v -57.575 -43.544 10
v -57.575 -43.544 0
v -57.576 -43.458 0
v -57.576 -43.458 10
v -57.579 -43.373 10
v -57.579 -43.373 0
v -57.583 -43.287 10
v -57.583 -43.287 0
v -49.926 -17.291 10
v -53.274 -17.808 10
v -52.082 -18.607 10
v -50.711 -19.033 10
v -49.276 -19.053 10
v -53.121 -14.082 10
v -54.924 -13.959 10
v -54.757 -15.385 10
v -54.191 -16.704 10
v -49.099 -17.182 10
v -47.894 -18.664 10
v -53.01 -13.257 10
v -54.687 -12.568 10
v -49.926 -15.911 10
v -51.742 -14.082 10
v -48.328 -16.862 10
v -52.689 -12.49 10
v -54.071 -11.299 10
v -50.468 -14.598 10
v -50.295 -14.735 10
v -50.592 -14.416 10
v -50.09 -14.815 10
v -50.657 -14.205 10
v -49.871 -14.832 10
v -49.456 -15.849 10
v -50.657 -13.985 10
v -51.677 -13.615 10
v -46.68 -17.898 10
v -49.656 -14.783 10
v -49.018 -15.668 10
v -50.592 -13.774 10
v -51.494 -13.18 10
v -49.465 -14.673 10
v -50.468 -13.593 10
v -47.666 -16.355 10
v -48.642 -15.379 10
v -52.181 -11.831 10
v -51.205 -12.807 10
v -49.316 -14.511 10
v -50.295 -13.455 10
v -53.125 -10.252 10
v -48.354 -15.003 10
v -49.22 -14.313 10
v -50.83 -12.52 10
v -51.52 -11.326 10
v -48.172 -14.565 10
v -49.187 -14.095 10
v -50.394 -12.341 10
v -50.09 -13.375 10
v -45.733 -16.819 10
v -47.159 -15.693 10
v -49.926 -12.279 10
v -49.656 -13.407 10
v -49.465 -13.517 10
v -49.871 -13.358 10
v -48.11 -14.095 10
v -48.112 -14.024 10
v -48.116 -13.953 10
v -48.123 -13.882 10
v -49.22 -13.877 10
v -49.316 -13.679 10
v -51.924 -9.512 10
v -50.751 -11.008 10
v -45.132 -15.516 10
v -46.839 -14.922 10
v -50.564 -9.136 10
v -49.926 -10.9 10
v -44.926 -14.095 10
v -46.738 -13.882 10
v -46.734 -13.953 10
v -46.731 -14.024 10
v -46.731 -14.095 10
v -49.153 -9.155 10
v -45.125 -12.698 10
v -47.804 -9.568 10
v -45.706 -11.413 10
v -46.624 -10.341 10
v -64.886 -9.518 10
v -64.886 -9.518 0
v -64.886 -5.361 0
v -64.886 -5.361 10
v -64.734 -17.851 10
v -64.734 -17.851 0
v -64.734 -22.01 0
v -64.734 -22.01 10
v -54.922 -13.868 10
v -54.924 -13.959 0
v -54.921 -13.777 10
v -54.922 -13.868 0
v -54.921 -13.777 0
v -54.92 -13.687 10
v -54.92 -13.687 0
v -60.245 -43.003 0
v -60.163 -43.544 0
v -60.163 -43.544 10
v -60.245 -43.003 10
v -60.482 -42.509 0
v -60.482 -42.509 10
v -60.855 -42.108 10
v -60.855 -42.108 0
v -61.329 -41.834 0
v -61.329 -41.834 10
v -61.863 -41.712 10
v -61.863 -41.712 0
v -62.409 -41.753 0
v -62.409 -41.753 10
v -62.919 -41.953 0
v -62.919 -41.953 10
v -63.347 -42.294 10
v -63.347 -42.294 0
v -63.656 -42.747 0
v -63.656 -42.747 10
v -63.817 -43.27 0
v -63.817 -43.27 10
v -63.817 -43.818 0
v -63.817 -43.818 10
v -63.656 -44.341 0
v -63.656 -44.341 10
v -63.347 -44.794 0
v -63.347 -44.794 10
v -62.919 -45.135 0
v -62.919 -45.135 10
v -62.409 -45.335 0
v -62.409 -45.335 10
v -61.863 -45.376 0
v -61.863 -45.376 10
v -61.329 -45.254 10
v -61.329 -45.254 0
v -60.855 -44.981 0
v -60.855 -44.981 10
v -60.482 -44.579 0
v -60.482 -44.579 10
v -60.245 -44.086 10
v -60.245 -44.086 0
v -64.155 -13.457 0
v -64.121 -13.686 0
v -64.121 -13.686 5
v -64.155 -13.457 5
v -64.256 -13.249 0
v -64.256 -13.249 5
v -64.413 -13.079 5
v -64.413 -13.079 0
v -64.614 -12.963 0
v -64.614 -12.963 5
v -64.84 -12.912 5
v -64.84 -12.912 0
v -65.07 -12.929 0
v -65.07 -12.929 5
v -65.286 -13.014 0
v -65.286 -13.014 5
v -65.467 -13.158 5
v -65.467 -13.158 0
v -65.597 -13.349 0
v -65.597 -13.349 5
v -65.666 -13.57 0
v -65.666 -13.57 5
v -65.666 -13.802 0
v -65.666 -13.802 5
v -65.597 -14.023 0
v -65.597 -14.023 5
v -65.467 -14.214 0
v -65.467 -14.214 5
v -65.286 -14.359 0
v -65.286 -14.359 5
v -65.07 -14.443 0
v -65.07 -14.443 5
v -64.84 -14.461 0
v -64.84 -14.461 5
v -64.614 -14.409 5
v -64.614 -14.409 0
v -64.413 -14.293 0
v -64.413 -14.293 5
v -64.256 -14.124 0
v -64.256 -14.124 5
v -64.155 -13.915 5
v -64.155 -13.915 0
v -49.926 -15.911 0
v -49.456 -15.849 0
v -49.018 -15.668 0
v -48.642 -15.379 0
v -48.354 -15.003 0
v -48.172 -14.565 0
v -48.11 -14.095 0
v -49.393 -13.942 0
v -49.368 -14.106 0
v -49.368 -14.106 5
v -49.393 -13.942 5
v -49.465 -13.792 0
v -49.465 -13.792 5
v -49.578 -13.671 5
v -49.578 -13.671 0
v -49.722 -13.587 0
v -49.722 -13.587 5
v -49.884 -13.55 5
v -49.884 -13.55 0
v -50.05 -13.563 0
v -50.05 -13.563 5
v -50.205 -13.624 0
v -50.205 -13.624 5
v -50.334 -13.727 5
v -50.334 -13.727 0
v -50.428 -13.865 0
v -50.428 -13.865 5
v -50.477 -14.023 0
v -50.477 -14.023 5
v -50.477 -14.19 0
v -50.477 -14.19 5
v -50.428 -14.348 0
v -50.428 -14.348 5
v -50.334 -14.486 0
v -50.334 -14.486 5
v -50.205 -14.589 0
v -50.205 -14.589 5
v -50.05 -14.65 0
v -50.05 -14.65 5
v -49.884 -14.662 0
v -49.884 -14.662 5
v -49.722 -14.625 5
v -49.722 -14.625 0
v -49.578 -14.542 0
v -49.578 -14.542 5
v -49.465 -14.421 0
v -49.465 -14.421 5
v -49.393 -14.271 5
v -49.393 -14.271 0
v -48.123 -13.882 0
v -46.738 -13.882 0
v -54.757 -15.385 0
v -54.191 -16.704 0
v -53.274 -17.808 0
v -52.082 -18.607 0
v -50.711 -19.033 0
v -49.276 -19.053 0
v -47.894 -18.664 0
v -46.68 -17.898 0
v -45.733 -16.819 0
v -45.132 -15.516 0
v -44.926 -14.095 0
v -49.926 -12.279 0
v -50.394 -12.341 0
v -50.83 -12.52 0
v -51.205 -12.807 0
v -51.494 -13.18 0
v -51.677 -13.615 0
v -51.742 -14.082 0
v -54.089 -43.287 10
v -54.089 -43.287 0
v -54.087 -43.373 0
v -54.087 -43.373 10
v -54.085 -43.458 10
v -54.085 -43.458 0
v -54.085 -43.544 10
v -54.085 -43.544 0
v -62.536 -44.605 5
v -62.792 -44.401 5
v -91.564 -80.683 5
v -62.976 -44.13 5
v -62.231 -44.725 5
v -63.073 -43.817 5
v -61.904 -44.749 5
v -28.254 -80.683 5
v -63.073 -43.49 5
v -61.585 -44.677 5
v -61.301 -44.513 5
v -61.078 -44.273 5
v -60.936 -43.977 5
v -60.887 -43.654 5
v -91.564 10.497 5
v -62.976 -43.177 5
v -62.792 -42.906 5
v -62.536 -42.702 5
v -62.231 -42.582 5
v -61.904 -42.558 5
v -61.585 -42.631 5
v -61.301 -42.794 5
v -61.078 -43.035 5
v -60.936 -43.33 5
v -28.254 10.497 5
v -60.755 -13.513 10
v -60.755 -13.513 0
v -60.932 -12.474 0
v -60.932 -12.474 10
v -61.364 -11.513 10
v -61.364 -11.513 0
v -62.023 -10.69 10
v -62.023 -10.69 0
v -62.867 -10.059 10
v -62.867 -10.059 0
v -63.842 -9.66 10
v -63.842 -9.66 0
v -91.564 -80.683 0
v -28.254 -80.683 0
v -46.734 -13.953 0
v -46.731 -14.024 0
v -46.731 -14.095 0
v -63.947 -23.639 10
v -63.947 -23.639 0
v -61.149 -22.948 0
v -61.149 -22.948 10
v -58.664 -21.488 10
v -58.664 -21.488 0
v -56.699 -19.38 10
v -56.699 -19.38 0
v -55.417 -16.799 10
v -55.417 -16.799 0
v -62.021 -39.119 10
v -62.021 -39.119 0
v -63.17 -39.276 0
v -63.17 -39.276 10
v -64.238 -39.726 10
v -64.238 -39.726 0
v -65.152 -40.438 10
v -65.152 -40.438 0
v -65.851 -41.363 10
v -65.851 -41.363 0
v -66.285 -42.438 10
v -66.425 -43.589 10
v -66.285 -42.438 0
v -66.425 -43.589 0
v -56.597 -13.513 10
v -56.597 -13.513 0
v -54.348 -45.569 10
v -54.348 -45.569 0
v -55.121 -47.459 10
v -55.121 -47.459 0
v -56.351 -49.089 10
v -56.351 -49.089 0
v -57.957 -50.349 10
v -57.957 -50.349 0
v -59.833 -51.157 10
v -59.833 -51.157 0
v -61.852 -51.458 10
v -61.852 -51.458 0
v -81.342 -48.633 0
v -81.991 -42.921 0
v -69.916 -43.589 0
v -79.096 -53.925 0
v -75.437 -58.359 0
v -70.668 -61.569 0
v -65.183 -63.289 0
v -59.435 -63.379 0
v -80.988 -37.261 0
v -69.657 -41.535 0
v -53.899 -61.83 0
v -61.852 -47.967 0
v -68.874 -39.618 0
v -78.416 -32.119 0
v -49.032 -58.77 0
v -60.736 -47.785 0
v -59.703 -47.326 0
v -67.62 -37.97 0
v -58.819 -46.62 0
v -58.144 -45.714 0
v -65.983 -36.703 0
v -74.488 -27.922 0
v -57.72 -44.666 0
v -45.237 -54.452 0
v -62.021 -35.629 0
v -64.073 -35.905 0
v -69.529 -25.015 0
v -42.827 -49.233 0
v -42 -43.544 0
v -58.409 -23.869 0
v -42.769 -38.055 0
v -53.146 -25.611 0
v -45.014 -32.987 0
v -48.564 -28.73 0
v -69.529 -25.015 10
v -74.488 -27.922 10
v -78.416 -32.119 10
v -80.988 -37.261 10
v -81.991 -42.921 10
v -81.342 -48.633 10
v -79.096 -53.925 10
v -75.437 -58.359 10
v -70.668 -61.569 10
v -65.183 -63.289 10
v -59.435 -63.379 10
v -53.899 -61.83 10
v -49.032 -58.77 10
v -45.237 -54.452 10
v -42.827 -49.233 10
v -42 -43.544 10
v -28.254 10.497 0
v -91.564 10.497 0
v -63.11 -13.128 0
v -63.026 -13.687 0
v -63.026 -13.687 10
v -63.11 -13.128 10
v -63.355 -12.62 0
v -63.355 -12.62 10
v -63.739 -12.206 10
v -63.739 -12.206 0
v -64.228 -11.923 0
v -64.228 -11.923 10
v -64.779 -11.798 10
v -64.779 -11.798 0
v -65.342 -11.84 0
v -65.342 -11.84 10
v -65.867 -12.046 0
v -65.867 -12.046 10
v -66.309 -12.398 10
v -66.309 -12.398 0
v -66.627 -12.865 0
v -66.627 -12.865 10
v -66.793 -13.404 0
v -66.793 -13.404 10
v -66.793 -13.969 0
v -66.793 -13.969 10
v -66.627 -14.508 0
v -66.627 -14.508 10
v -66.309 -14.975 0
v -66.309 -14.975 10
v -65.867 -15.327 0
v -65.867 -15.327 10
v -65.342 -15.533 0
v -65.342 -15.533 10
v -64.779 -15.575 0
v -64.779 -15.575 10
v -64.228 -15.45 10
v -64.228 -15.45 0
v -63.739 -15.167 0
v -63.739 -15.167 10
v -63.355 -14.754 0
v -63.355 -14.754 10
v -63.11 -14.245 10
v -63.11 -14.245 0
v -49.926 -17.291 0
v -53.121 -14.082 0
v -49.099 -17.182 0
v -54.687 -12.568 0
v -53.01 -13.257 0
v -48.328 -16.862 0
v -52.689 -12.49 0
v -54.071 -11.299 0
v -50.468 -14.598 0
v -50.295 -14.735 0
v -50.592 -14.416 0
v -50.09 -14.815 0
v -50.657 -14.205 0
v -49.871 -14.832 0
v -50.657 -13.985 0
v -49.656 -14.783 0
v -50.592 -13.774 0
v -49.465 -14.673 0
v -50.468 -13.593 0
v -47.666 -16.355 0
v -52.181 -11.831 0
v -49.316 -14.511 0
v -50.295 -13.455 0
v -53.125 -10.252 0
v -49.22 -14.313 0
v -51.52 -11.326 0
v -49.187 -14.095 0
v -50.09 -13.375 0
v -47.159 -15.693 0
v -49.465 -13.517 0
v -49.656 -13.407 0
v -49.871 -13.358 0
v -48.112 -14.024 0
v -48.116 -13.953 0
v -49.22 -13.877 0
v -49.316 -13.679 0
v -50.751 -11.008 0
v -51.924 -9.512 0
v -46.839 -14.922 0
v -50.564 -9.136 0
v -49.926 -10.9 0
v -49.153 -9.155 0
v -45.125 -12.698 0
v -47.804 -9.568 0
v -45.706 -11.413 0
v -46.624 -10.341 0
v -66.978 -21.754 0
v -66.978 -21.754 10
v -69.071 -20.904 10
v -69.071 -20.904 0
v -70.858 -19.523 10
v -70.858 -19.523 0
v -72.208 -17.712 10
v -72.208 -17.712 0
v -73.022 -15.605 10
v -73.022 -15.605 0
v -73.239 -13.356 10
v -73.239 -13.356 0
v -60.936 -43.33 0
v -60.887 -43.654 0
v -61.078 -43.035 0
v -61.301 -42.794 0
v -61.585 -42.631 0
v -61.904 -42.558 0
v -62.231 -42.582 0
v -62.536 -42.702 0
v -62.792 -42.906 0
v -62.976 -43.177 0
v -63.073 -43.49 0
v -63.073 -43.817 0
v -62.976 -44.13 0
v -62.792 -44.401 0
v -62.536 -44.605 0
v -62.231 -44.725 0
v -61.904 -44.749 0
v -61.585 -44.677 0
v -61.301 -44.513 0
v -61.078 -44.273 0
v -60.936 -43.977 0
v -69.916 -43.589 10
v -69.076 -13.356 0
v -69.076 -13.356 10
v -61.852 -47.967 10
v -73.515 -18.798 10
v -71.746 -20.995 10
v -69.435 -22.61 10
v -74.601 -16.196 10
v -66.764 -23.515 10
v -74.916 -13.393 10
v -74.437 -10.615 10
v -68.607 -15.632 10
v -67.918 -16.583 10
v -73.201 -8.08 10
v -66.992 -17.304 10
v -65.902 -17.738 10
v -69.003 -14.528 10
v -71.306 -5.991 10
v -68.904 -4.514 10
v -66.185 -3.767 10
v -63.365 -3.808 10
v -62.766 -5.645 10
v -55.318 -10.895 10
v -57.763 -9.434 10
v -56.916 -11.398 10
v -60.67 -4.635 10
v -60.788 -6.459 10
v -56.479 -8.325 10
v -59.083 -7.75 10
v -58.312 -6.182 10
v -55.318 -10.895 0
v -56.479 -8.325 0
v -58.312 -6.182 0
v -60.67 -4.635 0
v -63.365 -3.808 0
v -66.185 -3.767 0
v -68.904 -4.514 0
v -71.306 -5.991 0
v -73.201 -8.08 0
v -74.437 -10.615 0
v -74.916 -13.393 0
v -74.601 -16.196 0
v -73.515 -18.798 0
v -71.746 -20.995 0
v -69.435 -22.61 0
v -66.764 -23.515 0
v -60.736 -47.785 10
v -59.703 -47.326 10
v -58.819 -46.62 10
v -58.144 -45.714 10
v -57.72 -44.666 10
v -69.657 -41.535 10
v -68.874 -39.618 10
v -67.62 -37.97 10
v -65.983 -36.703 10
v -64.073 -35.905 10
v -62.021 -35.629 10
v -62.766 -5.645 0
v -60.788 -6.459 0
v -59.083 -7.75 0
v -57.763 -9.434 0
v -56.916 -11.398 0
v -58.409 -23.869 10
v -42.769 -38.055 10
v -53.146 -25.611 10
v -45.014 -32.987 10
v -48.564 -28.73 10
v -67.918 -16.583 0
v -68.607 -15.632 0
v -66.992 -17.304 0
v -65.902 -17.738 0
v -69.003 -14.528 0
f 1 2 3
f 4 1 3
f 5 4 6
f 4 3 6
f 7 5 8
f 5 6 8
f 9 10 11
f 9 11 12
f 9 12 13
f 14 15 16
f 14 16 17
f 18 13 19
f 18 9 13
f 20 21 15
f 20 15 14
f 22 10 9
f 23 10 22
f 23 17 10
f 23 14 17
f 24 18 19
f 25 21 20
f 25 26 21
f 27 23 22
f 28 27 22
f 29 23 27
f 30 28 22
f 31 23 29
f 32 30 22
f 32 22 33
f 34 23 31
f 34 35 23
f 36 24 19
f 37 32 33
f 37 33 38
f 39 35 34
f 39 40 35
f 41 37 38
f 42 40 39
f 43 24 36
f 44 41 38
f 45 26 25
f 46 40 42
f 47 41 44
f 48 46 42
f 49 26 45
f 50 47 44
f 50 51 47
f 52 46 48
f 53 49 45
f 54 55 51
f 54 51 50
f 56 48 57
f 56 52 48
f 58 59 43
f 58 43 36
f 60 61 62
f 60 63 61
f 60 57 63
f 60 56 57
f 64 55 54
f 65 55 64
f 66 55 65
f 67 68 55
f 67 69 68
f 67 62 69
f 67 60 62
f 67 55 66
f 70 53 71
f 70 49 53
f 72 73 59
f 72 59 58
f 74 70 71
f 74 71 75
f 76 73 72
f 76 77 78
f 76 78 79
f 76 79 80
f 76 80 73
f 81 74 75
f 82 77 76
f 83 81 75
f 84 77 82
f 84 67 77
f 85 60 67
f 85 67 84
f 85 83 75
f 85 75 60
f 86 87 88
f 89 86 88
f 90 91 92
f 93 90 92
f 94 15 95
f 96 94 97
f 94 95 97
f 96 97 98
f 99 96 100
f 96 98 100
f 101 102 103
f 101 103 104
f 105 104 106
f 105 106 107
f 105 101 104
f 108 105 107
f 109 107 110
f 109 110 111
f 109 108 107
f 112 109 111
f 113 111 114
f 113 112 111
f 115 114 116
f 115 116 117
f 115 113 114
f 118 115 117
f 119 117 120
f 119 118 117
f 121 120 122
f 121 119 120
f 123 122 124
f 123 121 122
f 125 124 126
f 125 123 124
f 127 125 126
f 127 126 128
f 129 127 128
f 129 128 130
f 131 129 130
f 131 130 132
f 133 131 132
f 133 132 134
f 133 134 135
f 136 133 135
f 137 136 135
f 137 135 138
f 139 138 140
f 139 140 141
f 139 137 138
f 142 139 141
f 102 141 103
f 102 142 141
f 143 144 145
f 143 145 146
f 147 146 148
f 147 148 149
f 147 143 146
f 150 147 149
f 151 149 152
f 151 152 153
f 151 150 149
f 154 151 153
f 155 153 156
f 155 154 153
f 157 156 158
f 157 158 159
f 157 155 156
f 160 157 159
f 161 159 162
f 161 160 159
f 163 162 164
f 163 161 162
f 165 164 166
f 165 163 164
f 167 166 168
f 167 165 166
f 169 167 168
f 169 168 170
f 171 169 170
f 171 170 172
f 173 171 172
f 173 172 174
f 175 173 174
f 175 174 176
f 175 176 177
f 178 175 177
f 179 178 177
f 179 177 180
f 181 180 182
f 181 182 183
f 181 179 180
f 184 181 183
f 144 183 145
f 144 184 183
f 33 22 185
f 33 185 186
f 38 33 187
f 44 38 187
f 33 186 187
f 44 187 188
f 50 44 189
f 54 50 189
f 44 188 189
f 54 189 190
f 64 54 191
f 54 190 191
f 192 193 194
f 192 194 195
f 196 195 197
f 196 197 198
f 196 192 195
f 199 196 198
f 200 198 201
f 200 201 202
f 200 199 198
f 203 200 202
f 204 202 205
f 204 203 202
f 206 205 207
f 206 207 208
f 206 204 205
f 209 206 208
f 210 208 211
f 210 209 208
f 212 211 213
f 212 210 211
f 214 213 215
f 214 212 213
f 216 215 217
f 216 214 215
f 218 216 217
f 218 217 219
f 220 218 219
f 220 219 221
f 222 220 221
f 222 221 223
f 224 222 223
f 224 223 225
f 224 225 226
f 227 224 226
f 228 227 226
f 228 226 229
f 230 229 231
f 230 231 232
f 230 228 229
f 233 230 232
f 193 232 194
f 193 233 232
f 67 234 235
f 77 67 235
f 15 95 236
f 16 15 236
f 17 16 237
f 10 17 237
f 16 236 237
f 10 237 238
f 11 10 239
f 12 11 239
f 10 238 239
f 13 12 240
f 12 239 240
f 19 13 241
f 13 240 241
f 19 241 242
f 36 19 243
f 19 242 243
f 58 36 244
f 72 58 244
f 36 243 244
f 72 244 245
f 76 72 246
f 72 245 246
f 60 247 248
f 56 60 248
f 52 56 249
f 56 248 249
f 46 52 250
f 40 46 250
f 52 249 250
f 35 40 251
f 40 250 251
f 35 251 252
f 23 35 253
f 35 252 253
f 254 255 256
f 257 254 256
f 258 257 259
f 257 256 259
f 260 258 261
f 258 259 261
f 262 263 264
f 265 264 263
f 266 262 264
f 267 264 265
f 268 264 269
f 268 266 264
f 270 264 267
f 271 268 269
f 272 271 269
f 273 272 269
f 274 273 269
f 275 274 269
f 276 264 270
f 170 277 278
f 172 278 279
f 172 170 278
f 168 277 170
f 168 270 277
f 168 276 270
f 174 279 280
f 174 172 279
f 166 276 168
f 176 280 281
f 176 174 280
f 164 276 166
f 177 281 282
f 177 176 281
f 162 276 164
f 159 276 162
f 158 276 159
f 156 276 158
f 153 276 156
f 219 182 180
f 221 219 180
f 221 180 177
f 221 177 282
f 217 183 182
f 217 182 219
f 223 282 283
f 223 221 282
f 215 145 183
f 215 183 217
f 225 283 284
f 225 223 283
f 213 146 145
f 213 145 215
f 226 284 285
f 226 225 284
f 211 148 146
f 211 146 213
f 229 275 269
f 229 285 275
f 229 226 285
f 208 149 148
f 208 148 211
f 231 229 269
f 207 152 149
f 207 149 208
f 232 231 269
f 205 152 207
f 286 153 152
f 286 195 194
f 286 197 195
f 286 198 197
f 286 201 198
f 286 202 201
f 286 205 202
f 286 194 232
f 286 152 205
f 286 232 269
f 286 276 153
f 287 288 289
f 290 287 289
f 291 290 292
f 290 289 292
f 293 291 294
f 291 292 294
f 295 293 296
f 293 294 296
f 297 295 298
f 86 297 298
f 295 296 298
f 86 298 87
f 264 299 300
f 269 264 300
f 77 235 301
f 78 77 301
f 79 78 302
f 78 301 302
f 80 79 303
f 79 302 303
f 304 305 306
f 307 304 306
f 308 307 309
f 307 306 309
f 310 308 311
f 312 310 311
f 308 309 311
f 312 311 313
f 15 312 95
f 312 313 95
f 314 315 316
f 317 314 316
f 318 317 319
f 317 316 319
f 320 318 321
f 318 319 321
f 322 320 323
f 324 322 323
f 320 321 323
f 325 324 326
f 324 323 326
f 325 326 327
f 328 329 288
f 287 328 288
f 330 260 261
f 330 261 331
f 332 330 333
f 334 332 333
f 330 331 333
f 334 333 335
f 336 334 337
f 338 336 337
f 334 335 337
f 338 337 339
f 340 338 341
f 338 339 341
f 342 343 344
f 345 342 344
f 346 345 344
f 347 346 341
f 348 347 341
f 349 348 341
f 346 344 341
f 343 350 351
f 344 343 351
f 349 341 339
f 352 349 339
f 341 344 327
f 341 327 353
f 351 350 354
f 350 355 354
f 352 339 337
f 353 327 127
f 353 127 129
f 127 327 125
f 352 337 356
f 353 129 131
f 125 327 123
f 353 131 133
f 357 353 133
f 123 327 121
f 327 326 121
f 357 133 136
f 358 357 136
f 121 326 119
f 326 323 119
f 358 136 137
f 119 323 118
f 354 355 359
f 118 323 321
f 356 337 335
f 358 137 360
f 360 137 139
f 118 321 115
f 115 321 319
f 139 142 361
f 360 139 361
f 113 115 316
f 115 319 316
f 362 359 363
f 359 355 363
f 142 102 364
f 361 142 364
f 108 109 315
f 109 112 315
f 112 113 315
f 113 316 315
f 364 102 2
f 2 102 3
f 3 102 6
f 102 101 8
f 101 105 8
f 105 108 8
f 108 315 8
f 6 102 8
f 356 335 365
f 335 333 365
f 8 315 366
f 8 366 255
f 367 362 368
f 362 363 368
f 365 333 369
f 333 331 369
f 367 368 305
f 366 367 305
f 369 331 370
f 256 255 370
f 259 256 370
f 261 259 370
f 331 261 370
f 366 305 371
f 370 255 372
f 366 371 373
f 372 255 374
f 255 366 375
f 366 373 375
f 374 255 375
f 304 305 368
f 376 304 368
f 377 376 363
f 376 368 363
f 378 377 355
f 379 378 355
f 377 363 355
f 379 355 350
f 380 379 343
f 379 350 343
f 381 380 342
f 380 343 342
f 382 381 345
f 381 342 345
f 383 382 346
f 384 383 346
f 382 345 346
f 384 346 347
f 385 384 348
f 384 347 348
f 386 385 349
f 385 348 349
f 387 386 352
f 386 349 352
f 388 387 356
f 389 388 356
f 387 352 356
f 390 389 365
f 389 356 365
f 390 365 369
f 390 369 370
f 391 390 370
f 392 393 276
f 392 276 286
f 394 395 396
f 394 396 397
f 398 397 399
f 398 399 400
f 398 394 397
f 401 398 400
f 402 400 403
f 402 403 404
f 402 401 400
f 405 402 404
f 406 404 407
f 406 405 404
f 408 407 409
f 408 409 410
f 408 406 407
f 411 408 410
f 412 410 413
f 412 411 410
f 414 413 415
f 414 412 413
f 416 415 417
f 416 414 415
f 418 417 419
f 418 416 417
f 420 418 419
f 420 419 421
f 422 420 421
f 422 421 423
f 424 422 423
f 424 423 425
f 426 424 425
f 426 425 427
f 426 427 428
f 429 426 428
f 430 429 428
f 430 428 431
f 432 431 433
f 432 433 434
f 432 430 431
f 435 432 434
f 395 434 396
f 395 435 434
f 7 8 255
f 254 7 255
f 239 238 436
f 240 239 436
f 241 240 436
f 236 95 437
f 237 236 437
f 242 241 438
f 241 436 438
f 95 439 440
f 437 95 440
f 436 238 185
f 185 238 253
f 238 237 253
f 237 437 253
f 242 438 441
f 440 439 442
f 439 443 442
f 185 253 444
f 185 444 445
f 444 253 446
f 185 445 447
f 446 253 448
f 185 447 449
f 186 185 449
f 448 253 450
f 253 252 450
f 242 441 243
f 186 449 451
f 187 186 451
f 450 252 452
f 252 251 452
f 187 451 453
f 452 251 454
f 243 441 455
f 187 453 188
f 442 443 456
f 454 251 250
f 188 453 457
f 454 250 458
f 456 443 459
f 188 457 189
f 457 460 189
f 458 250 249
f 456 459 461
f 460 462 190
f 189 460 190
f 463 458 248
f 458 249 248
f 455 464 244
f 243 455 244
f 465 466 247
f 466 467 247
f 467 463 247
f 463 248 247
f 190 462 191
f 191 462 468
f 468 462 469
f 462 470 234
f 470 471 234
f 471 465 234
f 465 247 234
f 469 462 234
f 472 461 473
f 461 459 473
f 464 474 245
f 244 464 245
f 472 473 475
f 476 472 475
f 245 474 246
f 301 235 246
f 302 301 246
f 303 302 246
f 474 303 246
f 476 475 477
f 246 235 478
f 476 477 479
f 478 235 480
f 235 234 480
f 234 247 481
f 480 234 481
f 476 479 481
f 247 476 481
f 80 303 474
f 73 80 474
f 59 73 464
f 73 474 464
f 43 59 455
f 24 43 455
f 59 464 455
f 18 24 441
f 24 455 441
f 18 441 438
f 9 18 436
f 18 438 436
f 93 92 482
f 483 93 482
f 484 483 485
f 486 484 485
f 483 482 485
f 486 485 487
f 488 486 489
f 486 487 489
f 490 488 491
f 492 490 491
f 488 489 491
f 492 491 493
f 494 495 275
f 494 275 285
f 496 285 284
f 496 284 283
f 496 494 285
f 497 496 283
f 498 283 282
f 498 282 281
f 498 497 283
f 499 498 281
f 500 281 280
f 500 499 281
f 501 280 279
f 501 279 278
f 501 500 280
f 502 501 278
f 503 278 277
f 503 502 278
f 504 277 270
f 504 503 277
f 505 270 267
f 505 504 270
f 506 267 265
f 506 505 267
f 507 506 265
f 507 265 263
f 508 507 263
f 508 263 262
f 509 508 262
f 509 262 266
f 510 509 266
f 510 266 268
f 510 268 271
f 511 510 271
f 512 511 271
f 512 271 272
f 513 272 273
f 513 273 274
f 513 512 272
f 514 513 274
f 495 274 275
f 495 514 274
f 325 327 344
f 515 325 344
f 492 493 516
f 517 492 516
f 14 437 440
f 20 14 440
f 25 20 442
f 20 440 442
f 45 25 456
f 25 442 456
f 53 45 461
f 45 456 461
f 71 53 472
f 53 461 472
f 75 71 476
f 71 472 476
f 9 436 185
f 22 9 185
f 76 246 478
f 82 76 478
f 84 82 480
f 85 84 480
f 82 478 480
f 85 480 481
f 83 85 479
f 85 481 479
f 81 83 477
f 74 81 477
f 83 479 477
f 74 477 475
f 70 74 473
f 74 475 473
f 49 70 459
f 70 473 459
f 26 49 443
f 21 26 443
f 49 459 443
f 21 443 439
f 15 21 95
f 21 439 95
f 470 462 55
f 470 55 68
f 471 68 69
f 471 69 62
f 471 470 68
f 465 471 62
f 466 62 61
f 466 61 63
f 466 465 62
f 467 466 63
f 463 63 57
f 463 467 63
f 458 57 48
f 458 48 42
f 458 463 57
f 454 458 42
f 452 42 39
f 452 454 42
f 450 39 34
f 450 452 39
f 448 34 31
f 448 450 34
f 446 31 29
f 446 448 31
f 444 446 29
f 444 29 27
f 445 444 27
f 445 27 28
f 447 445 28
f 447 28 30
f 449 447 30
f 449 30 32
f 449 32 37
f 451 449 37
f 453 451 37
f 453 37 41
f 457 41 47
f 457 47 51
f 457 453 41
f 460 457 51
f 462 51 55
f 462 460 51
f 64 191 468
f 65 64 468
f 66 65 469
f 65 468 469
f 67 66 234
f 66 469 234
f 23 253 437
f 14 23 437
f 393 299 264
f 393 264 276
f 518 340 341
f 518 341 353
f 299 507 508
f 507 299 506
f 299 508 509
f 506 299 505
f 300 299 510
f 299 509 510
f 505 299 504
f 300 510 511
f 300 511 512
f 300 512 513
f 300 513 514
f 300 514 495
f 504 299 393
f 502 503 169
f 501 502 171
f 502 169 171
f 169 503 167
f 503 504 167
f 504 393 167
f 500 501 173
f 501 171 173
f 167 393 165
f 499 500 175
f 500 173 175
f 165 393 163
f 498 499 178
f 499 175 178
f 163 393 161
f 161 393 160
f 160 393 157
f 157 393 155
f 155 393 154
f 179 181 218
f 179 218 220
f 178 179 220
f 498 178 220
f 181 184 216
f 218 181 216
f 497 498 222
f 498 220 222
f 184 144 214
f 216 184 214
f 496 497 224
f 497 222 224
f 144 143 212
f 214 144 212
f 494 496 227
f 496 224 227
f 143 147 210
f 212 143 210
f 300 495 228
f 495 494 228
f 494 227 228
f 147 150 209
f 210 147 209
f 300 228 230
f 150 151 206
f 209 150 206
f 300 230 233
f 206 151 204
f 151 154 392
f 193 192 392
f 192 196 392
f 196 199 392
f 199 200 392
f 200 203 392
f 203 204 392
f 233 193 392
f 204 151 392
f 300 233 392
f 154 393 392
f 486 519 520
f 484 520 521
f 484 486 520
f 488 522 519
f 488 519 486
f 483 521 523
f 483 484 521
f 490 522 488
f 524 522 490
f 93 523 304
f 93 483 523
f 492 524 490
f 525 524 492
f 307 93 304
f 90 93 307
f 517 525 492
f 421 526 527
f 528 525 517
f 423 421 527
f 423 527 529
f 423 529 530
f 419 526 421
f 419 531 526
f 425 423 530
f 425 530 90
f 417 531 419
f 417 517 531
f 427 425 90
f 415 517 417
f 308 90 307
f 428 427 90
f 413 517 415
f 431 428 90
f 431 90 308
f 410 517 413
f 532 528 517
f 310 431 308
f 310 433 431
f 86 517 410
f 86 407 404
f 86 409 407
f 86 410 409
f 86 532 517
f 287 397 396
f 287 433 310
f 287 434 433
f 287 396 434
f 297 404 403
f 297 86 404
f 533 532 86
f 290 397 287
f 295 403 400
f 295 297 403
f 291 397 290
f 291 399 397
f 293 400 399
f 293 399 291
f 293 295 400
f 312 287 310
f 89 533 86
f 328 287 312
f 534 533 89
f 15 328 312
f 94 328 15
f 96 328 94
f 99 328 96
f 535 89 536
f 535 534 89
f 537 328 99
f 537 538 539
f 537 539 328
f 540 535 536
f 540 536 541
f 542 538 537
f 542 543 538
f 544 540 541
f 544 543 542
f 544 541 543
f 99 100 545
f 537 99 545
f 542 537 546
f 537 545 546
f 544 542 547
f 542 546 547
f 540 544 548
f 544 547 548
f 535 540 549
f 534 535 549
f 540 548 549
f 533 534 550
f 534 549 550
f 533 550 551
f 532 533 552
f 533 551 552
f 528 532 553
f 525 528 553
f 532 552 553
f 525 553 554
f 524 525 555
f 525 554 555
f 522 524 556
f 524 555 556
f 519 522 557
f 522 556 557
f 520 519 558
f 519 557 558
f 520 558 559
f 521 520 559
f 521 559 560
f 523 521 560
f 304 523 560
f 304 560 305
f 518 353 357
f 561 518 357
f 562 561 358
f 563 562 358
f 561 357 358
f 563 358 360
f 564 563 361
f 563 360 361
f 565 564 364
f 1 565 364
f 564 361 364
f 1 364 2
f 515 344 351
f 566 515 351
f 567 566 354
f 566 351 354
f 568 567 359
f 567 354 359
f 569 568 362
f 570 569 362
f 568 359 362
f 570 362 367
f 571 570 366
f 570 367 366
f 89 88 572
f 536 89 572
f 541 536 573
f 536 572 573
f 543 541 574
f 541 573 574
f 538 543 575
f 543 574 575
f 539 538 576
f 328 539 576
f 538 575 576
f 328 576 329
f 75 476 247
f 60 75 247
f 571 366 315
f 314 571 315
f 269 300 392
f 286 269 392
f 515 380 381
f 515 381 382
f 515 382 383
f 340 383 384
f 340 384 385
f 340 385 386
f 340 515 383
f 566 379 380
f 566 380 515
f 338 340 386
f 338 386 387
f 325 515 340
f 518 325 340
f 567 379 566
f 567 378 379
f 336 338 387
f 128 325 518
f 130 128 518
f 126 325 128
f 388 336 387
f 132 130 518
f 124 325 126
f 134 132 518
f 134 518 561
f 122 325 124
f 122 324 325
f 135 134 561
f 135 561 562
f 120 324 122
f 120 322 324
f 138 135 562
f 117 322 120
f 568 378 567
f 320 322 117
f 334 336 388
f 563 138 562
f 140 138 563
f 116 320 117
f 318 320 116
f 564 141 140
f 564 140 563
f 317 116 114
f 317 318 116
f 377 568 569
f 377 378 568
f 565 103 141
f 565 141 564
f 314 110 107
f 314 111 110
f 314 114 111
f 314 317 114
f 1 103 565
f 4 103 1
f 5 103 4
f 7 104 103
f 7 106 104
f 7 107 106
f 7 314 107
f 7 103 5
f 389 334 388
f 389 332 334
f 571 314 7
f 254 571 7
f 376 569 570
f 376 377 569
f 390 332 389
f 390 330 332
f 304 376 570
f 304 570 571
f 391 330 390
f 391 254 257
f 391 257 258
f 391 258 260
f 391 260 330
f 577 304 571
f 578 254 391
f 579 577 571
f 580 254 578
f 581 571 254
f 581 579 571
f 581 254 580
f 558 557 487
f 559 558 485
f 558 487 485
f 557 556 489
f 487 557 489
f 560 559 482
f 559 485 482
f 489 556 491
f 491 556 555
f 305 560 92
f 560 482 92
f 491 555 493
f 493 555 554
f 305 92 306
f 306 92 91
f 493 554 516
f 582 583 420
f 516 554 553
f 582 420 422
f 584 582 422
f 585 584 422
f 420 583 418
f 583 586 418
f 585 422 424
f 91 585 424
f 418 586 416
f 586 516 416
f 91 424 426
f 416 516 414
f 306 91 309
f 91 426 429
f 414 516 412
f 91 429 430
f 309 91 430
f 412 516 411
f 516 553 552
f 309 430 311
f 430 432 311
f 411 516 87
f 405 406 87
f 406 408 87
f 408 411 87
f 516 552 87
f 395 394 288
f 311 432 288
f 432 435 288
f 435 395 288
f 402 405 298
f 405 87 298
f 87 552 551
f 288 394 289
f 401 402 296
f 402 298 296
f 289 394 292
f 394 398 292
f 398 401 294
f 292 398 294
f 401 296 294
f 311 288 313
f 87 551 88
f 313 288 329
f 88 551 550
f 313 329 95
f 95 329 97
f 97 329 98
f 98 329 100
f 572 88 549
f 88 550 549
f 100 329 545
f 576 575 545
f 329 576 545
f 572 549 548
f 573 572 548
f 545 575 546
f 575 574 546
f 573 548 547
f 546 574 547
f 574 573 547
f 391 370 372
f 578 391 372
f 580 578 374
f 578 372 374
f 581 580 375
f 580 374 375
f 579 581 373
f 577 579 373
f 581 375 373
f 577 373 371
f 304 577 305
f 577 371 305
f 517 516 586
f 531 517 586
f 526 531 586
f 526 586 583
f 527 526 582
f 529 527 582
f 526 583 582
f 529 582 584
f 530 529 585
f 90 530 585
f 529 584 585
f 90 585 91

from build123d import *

# Parameters (mm, degrees)
F0_R     = 1.894076
F0_R_2   = 1.837348
F0_R_3   = 0.738832
F1_DEPTH = 10
F2_W     = 63.309941
F2_H     = 91.180074
F2_R     = 1.098943
F2_R_2   = 0.776666
F2_R_3   = 0.557585
F3_DEPTH = 5


with BuildPart() as f1:
    # F0 (on Top) → F1 (new body)
    with BuildSketch(Plane.XY):
        with BuildLine():
            ThreePointArc((-54.924116, -13.958908), (-54.921334, -13.822768), (-54.920407, -13.686602))
            ThreePointArc((-54.920407, -13.686602), (-72.327615, -6.968472), (-63.947062, -23.639119))
            ThreePointArc((-63.947062, -23.639119), (-57.605364, -20.50497), (-54.924116, -13.958908))
        make_face()
        with BuildLine():
            ThreePointArc((-56.59659, -13.512996), (-56.595232, -13.599794), (-56.59478, -13.686602))
            ThreePointArc((-56.59478, -13.686602), (-58.967621, -19.50729), (-64.733604, -22.010134))
            ThreePointArc((-64.733604, -22.010134), (-70.85808, -19.522707), (-73.239478, -13.356229))
            ThreePointArc((-73.239478, -13.356229), (-70.677204, -7.672005), (-64.886253, -5.361044))
            ThreePointArc((-64.886253, -5.361044), (-59.082814, -7.750393), (-56.59659, -13.512996))
        make_face(mode=Mode.SUBTRACT)
        with BuildLine():
            Line((-64.886253, -9.518197), (-64.886253, -5.361044))
            ThreePointArc((-64.886253, -5.361044), (-70.677204, -7.672005), (-73.239478, -13.356229))
            Line((-73.239478, -13.356229), (-69.07584, -13.356229))
            ThreePointArc((-69.07584, -13.356229), (-67.73623, -10.612856), (-64.886253, -9.518197))
        make_face()
        with BuildLine():
            ThreePointArc((-64.733604, -22.010134), (-58.967621, -19.50729), (-56.59478, -13.686602))
            ThreePointArc((-56.59478, -13.686602), (-56.595232, -13.599794), (-56.59659, -13.512996))
            Line((-56.59659, -13.512996), (-60.755479, -13.512996))
            ThreePointArc((-60.755479, -13.512996), (-60.752767, -13.59978), (-60.751862, -13.686602))
            ThreePointArc((-60.751862, -13.686602), (-61.90748, -16.567406), (-64.733604, -17.850959))
            Line((-64.733604, -17.850959), (-64.733604, -22.010134))
        make_face()
        with BuildLine():
            ThreePointArc((-60.751862, -13.686602), (-60.752767, -13.59978), (-60.755479, -13.512996))
            ThreePointArc((-60.755479, -13.512996), (-62.022533, -10.690089), (-64.886253, -9.518197))
            ThreePointArc((-64.886253, -9.518197), (-67.73623, -10.612856), (-69.07584, -13.356229))
            ThreePointArc((-69.07584, -13.356229), (-67.918433, -16.582912), (-64.733604, -17.850959))
            ThreePointArc((-64.733604, -17.850959), (-61.90748, -16.567406), (-60.751862, -13.686602))
        make_face()
        with Locations((-64.920407, -13.686602)):
            Circle(F0_R, mode=Mode.SUBTRACT)
        with BuildLine():
            ThreePointArc((-42.000372, -43.544154), (-48.564111, -28.729738), (-63.947062, -23.639119))
            ThreePointArc((-63.947062, -23.639119), (-75.436632, -58.358569), (-42.000372, -43.544154))
        make_face()
        with BuildLine():
            ThreePointArc((-54.089022, -43.286919), (-54.085887, -43.415519), (-54.084842, -43.544154))
            ThreePointArc((-54.084842, -43.544154), (-56.351147, -49.08869), (-61.852326, -51.458299))
            ThreePointArc((-61.852326, -51.458299), (-67.52905, -49.208898), (-69.915777, -43.58853))
            ThreePointArc((-69.915777, -43.58853), (-67.620487, -37.970113), (-62.021154, -35.628651))
            ThreePointArc((-62.021154, -35.628651), (-56.502415, -37.849587), (-54.089022, -43.286919))
        make_face(mode=Mode.SUBTRACT)
        with BuildLine():
            Line((-57.582658, -43.286919), (-54.089022, -43.286919))
            ThreePointArc((-54.089022, -43.286919), (-56.502415, -37.849587), (-62.021154, -35.628651))
            Line((-62.021154, -35.628651), (-62.021154, -39.119006))
            ThreePointArc((-62.021154, -39.119006), (-58.97116, -40.318284), (-57.582658, -43.286919))
        make_face()
        with BuildLine():
            ThreePointArc((-69.915777, -43.58853), (-67.52905, -49.208898), (-61.852326, -51.458299))
            Line((-61.852326, -51.458299), (-61.852326, -47.966873))
            ThreePointArc((-61.852326, -47.966873), (-65.060682, -46.740536), (-66.425345, -43.58853))
            Line((-66.425345, -43.58853), (-69.915777, -43.58853))
        make_face()
        with BuildLine():
            ThreePointArc((-57.575176, -43.544154), (-57.577047, -43.415482), (-57.582658, -43.286919))
            ThreePointArc((-57.582658, -43.286919), (-58.97116, -40.318284), (-62.021154, -39.119006))
            ThreePointArc((-62.021154, -39.119006), (-65.152411, -40.43819), (-66.425345, -43.58853))
            ThreePointArc((-66.425345, -43.58853), (-65.060682, -46.740536), (-61.852326, -47.966873))
            ThreePointArc((-61.852326, -47.966873), (-58.819374, -46.620453), (-57.575176, -43.544154))
        make_face()
        with Locations((-62.000372, -43.544154)):
            Circle(F0_R_2, mode=Mode.SUBTRACT)
        with BuildLine():
            ThreePointArc((-44.92597, -14.09506), (-49.857887, -9.095524), (-54.924116, -13.958908))
            ThreePointArc((-54.924116, -13.958908), (-49.994052, -19.094597), (-44.92597, -14.09506))
        make_face()
        with BuildLine():
            ThreePointArc((-46.737649, -13.88158), (-46.732295, -13.988261), (-46.73051, -14.09506))
            ThreePointArc((-46.73051, -14.09506), (-47.666439, -16.354592), (-49.92597, -17.29052))
            ThreePointArc((-49.92597, -17.29052), (-52.190152, -16.349931), (-53.121402, -14.081892))
            ThreePointArc((-53.121402, -14.081892), (-52.18084, -11.830879), (-49.92597, -10.899601))
            ThreePointArc((-49.92597, -10.899601), (-47.74322, -11.761273), (-46.737649, -13.88158))
        make_face(mode=Mode.SUBTRACT)
        with BuildLine():
            ThreePointArc((-53.121402, -14.081892), (-52.190152, -16.349931), (-49.92597, -17.29052))
            Line((-49.92597, -17.29052), (-49.92597, -15.910761))
            ThreePointArc((-49.92597, -15.910761), (-51.214511, -15.37429), (-51.741622, -14.081892))
            Line((-51.741622, -14.081892), (-53.121402, -14.081892))
        make_face()
        with BuildLine():
            Line((-48.122863, -13.88158), (-46.737649, -13.88158))
            ThreePointArc((-46.737649, -13.88158), (-47.74322, -11.761273), (-49.92597, -10.899601))
            Line((-49.92597, -10.899601), (-49.92597, -12.27936))
            ThreePointArc((-49.92597, -12.27936), (-48.719912, -12.737787), (-48.122863, -13.88158))
        make_face()
        with BuildLine():
            ThreePointArc((-48.110269, -14.09506), (-48.11342, -13.988135), (-48.122863, -13.88158))
            ThreePointArc((-48.122863, -13.88158), (-48.719912, -12.737787), (-49.92597, -12.27936))
            ThreePointArc((-49.92597, -12.27936), (-51.2052, -12.806519), (-51.741622, -14.081892))
            ThreePointArc((-51.741622, -14.081892), (-51.214511, -15.37429), (-49.92597, -15.910761))
            ThreePointArc((-49.92597, -15.910761), (-48.642076, -15.378955), (-48.110269, -14.09506))
        make_face()
        with Locations((-49.92597, -14.09506)):
            Circle(F0_R_3, mode=Mode.SUBTRACT)
    extrude(amount=F1_DEPTH)


with BuildPart() as f3:
    # F2 (on Top) → F3 (new body)
    with BuildSketch(Plane.XY):
        with Locations((-59.908872, -35.093179)):
            Rectangle(F2_W, F2_H)
        with Locations((-61.986212, -43.653563)):
            Circle(F2_R, mode=Mode.SUBTRACT)
        with Locations((-64.897552, -13.68619)):
            Circle(F2_R_2, mode=Mode.SUBTRACT)
        with Locations((-49.925722, -14.106449)):
            Circle(F2_R_3, mode=Mode.SUBTRACT)
    extrude(amount=F3_DEPTH)


solid = Compound([f1.part, f3.part])
